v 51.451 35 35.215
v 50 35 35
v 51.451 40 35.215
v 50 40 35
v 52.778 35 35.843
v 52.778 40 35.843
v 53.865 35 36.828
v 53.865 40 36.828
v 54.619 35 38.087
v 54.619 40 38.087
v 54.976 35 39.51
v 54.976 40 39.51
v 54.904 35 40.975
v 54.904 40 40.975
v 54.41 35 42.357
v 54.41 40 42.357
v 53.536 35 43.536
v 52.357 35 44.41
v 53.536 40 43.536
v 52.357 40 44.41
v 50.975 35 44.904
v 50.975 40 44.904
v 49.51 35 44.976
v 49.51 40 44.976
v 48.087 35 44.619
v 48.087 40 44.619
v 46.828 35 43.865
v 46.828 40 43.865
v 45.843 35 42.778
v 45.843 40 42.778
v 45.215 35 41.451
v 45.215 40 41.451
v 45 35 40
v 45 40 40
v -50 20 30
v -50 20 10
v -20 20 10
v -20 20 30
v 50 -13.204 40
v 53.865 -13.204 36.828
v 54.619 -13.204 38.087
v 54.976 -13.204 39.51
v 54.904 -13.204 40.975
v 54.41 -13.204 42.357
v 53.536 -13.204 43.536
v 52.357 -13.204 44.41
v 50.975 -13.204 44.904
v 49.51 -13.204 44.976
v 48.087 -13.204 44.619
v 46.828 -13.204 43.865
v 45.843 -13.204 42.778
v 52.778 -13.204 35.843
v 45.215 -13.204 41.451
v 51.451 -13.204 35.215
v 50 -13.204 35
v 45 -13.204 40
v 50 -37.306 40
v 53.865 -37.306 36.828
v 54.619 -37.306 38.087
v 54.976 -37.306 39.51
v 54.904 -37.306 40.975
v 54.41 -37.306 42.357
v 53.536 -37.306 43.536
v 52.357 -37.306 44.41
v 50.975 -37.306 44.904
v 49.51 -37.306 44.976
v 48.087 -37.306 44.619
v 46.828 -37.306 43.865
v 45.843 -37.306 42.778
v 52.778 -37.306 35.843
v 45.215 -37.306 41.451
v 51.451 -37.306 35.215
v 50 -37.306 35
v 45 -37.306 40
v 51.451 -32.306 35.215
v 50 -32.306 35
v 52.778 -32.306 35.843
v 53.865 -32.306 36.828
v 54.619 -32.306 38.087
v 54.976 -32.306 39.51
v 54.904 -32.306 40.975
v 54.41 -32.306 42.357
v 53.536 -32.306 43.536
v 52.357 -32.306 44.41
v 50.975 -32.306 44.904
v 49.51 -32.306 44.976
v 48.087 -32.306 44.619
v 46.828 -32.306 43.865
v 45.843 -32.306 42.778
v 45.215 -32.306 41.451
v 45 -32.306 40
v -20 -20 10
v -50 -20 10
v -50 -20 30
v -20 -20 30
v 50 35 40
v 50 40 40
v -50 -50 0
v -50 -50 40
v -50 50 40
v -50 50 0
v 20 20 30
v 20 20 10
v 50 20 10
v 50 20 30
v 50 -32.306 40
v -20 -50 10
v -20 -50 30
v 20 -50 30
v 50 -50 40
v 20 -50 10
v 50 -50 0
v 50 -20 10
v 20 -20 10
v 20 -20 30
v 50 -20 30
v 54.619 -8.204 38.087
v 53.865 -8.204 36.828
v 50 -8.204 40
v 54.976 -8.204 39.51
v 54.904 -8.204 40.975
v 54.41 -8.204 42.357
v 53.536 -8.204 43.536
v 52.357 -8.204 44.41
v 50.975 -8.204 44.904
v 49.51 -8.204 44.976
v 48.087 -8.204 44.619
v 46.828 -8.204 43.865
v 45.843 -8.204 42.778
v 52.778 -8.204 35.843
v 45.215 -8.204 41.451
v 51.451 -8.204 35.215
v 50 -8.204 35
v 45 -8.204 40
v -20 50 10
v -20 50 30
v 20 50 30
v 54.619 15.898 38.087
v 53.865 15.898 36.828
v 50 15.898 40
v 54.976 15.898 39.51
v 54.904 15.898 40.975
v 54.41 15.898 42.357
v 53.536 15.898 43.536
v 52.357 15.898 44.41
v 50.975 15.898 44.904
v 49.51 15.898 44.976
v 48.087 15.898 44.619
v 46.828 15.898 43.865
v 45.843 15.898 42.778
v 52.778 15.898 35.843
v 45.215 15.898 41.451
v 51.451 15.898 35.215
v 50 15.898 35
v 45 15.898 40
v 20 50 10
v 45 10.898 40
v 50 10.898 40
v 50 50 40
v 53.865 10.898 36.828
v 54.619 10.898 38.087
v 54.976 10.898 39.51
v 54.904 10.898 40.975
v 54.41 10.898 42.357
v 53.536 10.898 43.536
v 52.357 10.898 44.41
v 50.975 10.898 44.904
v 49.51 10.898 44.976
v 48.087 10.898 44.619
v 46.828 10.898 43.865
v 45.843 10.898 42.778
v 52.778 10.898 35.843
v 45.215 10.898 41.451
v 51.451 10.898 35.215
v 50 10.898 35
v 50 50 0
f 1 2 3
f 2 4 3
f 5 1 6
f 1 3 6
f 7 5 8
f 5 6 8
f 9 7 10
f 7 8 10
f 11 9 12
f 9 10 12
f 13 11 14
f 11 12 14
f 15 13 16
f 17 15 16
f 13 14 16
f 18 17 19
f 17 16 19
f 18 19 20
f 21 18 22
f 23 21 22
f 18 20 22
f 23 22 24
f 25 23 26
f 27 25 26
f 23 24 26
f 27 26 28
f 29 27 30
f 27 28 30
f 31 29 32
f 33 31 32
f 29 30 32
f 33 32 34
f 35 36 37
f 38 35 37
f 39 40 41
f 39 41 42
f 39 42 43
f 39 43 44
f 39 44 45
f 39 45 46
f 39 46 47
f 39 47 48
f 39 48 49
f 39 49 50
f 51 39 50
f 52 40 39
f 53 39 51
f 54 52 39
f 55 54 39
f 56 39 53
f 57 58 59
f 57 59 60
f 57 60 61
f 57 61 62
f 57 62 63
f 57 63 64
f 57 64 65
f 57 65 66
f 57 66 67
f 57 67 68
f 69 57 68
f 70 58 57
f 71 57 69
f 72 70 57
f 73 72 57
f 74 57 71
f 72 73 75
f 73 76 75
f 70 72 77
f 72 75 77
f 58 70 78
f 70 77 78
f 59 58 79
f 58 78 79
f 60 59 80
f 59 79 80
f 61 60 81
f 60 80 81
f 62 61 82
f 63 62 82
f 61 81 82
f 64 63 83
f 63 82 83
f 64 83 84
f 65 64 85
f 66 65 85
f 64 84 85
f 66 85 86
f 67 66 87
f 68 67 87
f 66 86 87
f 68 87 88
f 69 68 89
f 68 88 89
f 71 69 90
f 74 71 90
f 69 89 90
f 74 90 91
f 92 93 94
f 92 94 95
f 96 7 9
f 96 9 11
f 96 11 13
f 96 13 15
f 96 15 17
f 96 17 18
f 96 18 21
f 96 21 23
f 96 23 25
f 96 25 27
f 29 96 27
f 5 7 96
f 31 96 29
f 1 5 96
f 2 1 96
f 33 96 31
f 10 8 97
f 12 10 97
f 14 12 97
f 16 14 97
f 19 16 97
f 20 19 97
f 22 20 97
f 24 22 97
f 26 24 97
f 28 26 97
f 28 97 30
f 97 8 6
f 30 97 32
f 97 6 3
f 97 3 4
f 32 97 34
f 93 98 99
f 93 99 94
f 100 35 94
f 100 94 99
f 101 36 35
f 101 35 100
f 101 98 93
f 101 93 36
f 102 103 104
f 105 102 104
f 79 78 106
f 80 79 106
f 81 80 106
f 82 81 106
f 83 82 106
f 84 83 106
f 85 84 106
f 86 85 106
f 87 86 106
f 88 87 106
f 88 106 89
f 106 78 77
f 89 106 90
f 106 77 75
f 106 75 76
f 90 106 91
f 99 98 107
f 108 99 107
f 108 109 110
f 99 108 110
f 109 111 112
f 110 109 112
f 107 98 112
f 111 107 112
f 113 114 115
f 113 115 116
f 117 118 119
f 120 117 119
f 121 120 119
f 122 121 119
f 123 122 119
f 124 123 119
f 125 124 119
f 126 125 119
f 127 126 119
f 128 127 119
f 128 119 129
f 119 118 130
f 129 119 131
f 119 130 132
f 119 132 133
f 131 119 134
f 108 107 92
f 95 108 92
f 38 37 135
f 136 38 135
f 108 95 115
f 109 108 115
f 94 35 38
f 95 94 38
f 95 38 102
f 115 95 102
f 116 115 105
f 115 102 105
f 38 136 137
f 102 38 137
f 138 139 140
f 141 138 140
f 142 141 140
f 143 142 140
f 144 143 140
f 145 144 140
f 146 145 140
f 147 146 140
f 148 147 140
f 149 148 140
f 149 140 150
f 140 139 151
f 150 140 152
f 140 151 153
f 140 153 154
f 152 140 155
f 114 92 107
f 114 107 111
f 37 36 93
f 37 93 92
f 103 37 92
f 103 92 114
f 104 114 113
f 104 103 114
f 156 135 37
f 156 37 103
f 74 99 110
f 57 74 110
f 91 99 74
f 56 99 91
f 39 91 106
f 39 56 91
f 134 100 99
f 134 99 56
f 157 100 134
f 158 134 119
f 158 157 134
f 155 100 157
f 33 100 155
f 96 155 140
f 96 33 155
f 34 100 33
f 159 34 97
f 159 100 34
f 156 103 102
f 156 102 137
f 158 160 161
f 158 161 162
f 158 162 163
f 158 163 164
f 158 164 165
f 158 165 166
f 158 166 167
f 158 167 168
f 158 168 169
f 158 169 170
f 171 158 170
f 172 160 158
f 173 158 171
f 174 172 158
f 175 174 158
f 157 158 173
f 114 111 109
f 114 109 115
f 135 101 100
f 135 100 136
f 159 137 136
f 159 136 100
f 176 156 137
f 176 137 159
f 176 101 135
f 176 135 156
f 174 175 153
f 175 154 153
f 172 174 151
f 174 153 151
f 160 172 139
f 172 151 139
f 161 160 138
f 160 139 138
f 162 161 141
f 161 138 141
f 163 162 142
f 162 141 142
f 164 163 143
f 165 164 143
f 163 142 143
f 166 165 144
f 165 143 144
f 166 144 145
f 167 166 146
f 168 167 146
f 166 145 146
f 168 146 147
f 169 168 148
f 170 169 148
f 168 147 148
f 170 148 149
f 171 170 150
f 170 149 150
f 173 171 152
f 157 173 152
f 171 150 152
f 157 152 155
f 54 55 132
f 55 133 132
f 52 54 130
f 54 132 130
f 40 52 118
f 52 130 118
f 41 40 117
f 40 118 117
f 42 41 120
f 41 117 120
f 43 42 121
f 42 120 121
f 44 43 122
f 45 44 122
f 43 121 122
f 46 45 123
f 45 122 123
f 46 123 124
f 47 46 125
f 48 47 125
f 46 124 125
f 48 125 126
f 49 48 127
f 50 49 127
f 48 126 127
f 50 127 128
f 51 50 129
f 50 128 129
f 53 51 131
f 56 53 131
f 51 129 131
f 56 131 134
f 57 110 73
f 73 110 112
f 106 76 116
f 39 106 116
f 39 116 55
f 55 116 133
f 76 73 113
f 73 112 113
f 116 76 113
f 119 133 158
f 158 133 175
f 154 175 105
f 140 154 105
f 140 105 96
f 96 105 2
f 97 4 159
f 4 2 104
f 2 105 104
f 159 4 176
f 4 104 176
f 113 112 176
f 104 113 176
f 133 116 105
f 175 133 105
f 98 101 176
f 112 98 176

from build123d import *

# Parameters (mm, degrees)
F0_W     = 100
F0_H     = 100
F1_DEPTH = 10
F2_W     = 30
F2_H     = 30
F3_DEPTH = 20
F5_W     = 100
F5_H     = 100
F6_DEPTH = 10
F7_W     = 5
F7_H     = 5


with BuildPart() as f1:
    # F0 (on Top) → F1 (new body)
    with BuildSketch(Plane.XY):
        Rectangle(F0_W, F0_H)
    extrude(amount=F1_DEPTH)

    # F2 (on face) → F3 (join)
    with BuildSketch(Plane.XY.offset(10)):
        with Locations((-35, 35)):
            Rectangle(F2_W, F2_H)
        with Locations((35, 35)):
            Rectangle(F2_W, F2_H)
        with Locations((-35, -35)):
            Rectangle(F2_W, F2_H)
        with Locations((35, -35)):
            Rectangle(F2_W, F2_H)
    extrude(amount=F3_DEPTH)

    # F5 (on offset) → F6 (join)
    with BuildSketch(Plane.XY.offset(30)):
        Rectangle(F5_W, F5_H)
    extrude(amount=F6_DEPTH)

    # F7 (on face) → F8 (revolve)
    with BuildSketch(Plane.XY.offset(40)):
        with Locations((47.5, 37.5)):
            Rectangle(F7_W, F7_H)
        with Locations((47.5, 13.3981328524)):
            Rectangle(F7_W, F7_H)
        with Locations((47.5, -10.7037342952)):
            Rectangle(F7_W, F7_H)
        with Locations((47.5, -34.8056014428)):
            Rectangle(F7_W, F7_H)
    revolve(axis=Axis((50, 0, 40), (0, -1, 0)))


solid = f1.part
